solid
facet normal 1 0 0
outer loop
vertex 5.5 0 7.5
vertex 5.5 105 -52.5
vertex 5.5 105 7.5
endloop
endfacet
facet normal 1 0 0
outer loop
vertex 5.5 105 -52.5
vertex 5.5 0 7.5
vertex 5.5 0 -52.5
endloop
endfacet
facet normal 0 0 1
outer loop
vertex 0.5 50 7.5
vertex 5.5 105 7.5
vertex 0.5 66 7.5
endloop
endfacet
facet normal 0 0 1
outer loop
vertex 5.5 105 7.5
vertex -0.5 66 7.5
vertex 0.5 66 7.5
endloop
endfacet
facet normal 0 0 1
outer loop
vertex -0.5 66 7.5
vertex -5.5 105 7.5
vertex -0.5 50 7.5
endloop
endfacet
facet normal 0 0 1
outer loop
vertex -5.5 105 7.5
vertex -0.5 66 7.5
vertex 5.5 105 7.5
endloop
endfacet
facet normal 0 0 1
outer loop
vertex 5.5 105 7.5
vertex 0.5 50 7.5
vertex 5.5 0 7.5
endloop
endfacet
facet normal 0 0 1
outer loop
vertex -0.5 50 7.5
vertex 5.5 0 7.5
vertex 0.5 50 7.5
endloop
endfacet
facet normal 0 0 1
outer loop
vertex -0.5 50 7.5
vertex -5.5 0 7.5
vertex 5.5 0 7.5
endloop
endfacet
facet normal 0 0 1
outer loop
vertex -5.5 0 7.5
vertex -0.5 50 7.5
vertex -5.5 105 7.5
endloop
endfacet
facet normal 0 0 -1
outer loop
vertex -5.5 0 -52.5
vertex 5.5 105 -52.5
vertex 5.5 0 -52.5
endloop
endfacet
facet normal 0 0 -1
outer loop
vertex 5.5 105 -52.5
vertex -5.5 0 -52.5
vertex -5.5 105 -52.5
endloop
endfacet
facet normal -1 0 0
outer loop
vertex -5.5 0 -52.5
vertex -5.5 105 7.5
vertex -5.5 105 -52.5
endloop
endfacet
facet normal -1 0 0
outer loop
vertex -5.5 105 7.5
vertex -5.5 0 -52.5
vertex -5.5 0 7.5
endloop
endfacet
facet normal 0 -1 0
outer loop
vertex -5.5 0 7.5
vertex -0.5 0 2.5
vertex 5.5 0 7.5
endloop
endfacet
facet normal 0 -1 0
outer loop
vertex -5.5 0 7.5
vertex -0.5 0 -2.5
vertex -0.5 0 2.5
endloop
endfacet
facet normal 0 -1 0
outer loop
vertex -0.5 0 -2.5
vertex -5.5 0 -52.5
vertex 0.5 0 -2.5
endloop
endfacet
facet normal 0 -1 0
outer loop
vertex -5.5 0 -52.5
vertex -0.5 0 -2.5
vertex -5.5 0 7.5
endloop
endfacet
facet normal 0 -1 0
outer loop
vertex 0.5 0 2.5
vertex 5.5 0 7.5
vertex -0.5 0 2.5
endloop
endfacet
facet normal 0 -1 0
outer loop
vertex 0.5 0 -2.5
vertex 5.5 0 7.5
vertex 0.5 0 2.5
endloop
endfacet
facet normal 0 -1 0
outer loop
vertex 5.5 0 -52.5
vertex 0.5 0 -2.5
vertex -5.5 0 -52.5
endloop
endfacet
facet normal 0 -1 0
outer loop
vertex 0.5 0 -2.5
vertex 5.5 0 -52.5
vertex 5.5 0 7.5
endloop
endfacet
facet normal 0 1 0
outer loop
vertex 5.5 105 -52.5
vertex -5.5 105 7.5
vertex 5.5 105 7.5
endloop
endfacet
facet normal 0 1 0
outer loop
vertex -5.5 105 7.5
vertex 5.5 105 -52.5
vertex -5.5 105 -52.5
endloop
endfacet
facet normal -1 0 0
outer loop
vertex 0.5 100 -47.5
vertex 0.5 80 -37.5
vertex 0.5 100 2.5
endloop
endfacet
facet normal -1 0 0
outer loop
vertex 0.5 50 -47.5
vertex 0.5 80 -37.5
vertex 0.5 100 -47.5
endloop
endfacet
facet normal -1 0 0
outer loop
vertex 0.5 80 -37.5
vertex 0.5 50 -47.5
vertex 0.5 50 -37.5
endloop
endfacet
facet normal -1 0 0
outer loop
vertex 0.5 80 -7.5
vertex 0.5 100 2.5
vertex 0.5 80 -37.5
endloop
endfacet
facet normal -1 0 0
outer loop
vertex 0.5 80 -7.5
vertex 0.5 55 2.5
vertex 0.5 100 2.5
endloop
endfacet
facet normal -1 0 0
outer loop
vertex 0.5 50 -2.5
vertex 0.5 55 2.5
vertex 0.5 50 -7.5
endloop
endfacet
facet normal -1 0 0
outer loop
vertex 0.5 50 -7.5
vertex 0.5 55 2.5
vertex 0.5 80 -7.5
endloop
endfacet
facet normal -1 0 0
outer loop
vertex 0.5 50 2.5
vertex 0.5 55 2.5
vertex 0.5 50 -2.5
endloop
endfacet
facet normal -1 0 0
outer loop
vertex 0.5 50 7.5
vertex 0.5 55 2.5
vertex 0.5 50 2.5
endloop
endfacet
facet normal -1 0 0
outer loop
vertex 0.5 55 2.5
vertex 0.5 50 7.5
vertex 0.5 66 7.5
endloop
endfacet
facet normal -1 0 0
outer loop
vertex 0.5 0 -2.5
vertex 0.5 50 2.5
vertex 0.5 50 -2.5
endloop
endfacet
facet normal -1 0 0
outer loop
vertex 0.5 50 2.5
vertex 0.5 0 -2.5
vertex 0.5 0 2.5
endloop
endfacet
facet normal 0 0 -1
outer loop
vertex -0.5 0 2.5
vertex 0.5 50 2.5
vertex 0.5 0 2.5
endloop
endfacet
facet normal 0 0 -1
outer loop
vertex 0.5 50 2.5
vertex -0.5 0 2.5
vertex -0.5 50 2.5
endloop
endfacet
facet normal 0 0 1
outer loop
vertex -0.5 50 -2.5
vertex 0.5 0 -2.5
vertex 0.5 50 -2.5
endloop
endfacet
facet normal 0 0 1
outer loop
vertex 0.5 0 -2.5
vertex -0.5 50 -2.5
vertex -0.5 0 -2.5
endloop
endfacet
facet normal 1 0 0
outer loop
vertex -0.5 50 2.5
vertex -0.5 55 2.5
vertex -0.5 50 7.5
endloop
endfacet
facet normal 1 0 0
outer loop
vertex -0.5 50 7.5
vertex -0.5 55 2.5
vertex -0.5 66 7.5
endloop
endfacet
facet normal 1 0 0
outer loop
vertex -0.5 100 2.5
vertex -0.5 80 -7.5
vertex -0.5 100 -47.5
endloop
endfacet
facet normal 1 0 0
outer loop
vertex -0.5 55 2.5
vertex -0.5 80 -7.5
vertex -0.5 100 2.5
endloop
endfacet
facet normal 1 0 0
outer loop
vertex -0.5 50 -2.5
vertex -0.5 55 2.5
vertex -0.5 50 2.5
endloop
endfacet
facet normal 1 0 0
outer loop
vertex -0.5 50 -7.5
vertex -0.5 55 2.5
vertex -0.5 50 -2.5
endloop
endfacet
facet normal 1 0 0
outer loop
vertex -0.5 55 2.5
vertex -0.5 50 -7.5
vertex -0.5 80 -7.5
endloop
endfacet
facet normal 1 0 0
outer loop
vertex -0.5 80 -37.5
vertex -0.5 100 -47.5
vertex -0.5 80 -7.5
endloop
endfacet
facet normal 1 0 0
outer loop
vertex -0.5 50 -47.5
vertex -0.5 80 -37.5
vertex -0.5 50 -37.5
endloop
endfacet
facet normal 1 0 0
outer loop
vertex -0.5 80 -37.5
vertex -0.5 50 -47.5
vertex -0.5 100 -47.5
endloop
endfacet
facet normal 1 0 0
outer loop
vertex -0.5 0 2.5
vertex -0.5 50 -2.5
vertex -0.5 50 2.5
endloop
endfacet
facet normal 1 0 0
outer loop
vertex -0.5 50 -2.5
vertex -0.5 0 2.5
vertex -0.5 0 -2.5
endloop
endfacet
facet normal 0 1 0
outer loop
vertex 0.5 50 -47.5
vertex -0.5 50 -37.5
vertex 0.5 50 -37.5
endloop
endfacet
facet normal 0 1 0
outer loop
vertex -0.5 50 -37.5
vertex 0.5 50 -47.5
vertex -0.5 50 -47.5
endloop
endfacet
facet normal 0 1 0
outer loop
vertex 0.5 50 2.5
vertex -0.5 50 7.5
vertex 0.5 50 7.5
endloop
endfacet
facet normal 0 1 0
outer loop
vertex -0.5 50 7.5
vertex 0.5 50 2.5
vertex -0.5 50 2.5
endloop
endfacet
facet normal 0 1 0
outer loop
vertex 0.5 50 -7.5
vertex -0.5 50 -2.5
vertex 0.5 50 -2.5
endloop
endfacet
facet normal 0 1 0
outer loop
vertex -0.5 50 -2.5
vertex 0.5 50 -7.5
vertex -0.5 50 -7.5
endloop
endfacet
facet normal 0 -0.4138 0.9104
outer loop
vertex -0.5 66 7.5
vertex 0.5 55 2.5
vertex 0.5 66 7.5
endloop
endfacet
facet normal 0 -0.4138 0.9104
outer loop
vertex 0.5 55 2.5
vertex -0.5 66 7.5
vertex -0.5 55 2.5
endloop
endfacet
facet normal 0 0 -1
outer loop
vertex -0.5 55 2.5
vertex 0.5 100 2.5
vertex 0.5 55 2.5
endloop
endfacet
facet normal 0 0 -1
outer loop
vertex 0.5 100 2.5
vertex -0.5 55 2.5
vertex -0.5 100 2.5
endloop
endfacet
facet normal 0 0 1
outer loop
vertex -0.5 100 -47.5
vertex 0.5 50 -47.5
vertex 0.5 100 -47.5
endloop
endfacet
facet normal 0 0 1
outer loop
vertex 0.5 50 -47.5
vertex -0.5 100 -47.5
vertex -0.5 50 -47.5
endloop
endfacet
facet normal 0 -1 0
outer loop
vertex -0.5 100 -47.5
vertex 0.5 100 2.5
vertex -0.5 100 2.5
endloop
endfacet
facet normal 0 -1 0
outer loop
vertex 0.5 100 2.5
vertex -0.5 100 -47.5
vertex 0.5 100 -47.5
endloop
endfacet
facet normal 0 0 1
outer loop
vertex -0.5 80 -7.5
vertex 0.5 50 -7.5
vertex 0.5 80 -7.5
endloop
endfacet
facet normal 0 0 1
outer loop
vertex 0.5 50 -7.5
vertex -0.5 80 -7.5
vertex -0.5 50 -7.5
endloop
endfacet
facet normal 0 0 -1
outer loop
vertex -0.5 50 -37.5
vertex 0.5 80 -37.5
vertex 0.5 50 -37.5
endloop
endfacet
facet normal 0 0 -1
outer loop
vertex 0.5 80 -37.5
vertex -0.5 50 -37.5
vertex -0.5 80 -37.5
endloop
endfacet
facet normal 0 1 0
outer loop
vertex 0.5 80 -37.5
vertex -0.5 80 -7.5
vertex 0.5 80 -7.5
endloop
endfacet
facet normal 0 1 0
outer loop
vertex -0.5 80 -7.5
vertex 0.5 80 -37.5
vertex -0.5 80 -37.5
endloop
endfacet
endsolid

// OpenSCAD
// Baseline CAD geometry, with all dimensions in millimetres; +Y follows the throat and +Z is up.
// Positive modules describe air/cutting volumes; skin modules describe outer material.
// solidBody subtracts the former from the latter. The thin spawn cube spans Y=-1 to 0,
// so the generator can retain its Y=0 face and construct the inlet boundary rectangle.
// The final two calls display BOTH objects. Export each module separately as ASCII STL
// using the wrapper procedure in README; exporting this complete scene combines them.

skinThickness = 5;

throatWidth = 1;
throatLength = 50;
throatHeight = 5;

voicingHoleWidth = 1;
voicingHoleLength = 5;
voicingHoleHeight = skinThickness;
voicingHoleX = -voicingHoleWidth / 2;
voicingHoleY = throatLength;
voicingHoleZ = throatHeight / 2;

voicingEdgeLength = 10;

pressureChamberWidth = 1;
pressureChamberLength = 50;
pressureChamberHeight = 50;
pressureChamberX = -pressureChamberWidth / 2;
pressureChamberY = throatLength;
pressureChamberZ = -pressureChamberHeight + throatHeight / 2;

chamberFillerLength = 30;
chamberFillerHeight = 30;


module throatPositive() {
    translate([-throatWidth / 2, -1, -throatHeight / 2])
    cube([throatWidth, throatLength + 2, throatHeight]);
}

module throatSkin() {
    translate([-(pressureChamberWidth + skinThickness * 2) / 2, 0, pressureChamberZ - skinThickness])
    cube([pressureChamberWidth + skinThickness * 2, throatLength - 1, pressureChamberHeight + skinThickness * 2]);
}

module voicingHolePositive() {
    translate([voicingHoleX, voicingHoleY, voicingHoleZ - 1])
    cube([voicingHoleWidth, voicingHoleLength, voicingHoleHeight + 2]);
}

module voicingEdgePositive() {
    translate([voicingHoleWidth / 2, voicingHoleY + voicingHoleLength - 0.00001, throatHeight / 2])
    rotate([0, -90, 0])
    linear_extrude(height = voicingHoleWidth)
    polygon([
        [0, 0],
        [skinThickness + 0.00001, 0],
        [skinThickness + 0.00001, voicingEdgeLength + 1]
    ]);
}

module pressureChamberPositive() {
    translate([pressureChamberX, pressureChamberY, pressureChamberZ])
    cube([pressureChamberWidth, pressureChamberLength, pressureChamberHeight]);
}

module pressureChamberSkin() {
    translate([pressureChamberX - skinThickness, pressureChamberY - skinThickness, pressureChamberZ - skinThickness])
    cube([pressureChamberWidth + skinThickness * 2, pressureChamberLength + skinThickness * 2, pressureChamberHeight + skinThickness * 2]);
}

module positiveGroup() {
    union() {
        throatPositive();
        voicingHolePositive();
        voicingEdgePositive();
        pressureChamberPositive();
    }
}

module skinGroup() {
    union() {
        throatSkin();
        pressureChamberSkin();
    }
}

module solidBody() {
    difference() {
        skinGroup();
        positiveGroup();
    }
    
    translate([pressureChamberX - skinThickness, pressureChamberY, pressureChamberZ + pressureChamberHeight / 2 - chamberFillerHeight / 2])
    cube([pressureChamberWidth + skinThickness * 2, chamberFillerLength, chamberFillerHeight]);
    
}

module spawnPlane() {
    translate([-throatWidth / 2, -1, -throatHeight / 2])
    cube([throatWidth, 1, throatHeight]);
}

difference() {
solidBody();
//translate([0, -500, -500]) cube([1000, 1000, 1000]);
}
*spawnPlane();
